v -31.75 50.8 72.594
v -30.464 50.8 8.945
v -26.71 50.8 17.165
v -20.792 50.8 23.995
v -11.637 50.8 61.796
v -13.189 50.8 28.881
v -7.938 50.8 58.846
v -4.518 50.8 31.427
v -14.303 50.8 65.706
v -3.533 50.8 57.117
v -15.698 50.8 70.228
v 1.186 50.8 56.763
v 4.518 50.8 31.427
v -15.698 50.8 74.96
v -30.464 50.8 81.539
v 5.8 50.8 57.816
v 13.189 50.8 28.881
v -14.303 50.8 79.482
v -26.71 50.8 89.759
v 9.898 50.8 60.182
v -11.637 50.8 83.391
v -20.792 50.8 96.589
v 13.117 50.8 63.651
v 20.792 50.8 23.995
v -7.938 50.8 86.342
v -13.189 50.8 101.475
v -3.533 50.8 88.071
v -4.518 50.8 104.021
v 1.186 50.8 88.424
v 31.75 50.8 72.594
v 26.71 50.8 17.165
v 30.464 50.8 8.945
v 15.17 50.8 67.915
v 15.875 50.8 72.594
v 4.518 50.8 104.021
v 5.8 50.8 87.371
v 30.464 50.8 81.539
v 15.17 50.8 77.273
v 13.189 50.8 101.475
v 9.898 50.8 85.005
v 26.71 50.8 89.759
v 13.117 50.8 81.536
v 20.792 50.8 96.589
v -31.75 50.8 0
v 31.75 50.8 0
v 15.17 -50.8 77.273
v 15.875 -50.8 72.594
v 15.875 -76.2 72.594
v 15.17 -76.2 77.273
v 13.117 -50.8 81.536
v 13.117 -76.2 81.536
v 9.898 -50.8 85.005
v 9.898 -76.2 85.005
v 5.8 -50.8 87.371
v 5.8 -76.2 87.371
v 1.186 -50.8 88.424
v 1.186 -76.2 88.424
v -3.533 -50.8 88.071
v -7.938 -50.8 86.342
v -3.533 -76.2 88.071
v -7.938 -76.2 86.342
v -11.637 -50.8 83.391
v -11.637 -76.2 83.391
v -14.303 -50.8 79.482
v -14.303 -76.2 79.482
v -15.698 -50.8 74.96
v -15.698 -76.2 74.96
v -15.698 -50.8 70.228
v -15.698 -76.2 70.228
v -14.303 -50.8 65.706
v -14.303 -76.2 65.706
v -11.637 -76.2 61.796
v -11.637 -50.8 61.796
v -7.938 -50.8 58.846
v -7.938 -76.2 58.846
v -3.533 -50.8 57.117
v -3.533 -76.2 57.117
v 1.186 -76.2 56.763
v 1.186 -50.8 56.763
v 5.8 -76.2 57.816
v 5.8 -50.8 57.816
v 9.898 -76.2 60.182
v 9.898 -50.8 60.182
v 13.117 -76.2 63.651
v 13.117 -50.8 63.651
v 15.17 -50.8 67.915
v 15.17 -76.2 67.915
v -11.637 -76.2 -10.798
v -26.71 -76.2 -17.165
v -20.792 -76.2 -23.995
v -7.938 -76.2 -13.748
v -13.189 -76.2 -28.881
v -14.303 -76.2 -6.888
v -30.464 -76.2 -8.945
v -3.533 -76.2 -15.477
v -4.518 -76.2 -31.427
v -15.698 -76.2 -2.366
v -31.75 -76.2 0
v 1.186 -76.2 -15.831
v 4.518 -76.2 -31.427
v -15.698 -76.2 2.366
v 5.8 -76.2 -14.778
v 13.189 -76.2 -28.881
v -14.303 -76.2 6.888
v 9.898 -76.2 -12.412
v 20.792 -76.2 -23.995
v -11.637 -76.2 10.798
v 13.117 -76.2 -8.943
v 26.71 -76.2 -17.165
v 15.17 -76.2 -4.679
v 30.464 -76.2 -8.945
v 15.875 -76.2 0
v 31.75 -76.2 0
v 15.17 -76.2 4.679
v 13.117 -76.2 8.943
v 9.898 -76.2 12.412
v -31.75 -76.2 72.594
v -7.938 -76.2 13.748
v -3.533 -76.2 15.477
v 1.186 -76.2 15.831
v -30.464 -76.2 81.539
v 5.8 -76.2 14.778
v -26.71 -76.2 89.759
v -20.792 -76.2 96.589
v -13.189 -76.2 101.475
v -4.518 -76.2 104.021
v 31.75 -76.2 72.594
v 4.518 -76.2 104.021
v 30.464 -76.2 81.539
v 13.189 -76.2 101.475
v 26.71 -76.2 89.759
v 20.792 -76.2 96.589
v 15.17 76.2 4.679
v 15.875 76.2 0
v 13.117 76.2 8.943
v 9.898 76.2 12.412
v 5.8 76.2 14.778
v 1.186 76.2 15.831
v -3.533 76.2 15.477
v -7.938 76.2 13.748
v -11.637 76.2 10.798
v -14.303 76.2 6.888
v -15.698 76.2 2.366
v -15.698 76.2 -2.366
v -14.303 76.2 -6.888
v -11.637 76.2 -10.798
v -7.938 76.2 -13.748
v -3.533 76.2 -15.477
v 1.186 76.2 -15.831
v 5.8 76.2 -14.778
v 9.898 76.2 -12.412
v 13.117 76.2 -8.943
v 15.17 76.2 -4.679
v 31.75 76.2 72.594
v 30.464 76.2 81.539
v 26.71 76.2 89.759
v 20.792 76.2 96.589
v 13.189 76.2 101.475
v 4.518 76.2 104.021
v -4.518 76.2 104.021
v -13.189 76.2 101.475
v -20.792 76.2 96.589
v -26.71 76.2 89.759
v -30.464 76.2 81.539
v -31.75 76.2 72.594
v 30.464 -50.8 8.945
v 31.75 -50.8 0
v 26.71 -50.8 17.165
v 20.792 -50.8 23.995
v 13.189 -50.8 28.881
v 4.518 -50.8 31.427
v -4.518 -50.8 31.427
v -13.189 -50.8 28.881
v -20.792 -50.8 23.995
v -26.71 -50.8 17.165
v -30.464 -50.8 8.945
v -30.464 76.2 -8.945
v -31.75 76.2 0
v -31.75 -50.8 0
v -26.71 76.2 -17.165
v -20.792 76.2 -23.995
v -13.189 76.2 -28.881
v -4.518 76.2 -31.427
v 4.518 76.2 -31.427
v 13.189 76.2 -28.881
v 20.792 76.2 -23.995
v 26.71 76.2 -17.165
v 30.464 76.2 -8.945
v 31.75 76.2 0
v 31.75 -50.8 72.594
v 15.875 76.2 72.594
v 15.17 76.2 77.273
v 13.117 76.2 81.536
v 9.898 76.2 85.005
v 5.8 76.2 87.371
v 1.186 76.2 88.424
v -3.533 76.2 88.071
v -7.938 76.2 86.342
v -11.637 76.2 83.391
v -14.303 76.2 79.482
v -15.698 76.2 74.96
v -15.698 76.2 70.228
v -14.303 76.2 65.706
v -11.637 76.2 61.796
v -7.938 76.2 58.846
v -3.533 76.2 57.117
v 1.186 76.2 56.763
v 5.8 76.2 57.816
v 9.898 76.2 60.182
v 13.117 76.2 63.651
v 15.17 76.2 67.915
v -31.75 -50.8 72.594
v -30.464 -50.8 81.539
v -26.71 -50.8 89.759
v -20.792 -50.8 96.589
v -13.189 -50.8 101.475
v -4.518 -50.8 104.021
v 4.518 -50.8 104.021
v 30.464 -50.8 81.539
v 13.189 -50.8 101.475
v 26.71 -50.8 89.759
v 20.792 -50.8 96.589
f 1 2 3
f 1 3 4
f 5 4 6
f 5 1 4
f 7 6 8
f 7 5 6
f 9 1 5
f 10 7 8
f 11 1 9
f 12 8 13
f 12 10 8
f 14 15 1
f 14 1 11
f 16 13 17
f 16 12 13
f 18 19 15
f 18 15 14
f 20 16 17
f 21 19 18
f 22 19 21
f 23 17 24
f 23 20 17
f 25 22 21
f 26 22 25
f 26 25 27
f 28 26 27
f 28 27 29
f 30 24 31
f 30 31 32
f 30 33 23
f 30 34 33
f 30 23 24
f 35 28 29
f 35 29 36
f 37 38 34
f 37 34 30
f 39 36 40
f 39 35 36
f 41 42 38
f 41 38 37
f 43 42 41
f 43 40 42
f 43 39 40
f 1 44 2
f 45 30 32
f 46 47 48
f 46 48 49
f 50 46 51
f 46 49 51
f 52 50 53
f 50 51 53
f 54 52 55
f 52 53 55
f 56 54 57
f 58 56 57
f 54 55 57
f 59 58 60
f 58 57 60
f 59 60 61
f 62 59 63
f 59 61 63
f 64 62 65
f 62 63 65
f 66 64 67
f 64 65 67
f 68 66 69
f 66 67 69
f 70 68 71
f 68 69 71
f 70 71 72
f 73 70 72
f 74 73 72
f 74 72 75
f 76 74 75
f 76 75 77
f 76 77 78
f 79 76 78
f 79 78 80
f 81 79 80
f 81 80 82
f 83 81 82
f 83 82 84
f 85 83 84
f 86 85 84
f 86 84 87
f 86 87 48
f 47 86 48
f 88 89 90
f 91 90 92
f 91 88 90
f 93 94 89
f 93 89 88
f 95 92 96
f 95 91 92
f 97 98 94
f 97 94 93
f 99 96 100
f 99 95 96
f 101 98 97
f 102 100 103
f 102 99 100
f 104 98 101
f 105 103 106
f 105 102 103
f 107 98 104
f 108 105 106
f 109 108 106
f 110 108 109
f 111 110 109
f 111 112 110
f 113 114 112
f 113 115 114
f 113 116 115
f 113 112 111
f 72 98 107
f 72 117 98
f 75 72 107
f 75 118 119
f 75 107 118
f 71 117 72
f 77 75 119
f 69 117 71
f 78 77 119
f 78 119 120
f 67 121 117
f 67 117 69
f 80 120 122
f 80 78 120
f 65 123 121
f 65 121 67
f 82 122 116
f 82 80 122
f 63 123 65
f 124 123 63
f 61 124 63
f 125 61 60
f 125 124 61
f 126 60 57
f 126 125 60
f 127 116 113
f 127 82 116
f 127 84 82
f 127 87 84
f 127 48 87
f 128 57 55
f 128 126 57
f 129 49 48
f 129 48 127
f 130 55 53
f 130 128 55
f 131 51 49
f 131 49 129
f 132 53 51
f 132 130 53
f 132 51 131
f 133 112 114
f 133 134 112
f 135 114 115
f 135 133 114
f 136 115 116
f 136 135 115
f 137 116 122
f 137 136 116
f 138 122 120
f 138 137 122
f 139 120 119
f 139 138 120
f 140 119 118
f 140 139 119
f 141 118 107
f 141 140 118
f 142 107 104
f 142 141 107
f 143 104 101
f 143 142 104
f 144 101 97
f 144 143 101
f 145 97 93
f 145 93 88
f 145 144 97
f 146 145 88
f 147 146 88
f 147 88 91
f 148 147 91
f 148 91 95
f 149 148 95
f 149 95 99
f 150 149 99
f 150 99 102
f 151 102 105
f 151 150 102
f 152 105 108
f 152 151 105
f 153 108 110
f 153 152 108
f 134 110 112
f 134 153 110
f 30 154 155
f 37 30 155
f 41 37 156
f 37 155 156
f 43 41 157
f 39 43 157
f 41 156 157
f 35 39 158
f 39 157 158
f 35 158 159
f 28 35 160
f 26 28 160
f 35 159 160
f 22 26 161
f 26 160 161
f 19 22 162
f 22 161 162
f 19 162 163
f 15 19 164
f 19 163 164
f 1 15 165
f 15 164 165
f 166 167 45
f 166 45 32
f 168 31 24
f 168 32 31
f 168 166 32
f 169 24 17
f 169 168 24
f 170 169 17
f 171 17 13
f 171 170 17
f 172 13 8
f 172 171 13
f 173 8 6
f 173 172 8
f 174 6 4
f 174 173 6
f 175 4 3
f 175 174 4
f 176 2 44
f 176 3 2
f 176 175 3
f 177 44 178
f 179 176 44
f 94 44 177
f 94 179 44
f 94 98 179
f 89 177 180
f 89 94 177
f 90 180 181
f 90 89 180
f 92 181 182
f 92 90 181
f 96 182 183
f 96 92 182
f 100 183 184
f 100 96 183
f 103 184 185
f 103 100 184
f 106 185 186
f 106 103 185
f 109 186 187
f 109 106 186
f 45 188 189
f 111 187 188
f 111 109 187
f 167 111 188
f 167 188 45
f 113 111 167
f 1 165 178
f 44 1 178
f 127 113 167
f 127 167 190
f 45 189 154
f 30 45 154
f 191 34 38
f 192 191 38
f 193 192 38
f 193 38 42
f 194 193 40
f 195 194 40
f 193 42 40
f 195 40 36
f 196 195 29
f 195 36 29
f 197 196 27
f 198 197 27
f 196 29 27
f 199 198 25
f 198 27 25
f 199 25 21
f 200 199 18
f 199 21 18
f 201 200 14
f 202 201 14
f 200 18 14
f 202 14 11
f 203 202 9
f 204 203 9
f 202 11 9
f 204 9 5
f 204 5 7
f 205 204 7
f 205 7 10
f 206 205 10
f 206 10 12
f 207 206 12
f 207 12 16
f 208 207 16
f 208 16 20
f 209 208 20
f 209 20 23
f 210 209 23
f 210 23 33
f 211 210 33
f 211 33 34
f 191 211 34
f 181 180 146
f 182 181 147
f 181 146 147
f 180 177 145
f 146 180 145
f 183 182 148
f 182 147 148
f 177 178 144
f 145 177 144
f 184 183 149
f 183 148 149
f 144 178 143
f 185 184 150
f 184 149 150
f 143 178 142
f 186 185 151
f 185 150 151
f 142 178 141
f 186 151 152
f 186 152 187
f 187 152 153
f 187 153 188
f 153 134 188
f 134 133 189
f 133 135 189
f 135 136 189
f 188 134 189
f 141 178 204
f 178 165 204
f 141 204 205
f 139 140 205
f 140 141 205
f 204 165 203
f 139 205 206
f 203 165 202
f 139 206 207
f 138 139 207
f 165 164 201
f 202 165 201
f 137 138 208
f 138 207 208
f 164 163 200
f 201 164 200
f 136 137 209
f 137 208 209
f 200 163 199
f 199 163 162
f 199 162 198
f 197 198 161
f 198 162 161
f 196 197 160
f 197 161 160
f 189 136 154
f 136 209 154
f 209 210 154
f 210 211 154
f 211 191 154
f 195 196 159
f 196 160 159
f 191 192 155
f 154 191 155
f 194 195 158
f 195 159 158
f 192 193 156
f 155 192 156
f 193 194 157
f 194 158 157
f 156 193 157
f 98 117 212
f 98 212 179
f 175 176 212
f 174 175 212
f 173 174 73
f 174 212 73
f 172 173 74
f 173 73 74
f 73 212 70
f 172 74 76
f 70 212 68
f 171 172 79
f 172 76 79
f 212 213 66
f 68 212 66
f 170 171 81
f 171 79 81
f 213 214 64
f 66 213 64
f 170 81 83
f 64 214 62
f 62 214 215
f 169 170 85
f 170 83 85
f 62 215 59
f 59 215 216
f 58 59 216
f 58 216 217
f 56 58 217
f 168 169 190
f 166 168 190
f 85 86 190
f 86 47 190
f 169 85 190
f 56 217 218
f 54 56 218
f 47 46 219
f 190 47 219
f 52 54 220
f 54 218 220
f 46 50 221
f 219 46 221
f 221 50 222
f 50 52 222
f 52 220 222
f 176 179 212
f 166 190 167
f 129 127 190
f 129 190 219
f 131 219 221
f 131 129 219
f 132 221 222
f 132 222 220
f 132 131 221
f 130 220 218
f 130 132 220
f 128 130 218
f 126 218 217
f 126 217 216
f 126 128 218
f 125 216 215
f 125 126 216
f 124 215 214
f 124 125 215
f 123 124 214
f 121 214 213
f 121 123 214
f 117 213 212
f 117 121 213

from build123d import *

# Parameters (mm, degrees)
F0_R     = 31.75
F0_R_2   = 15.875
F1_DEPTH = 76.2
F3_DEPTH = 25.4
F5_R     = 15.875
F6_DEPTH = 152.401


with BuildPart() as f1:
    # F0 (on Front) → F1 (new body, symmetric)
    with BuildSketch(Plane.XZ):
        Circle(F0_R)
        Circle(F0_R_2, mode=Mode.SUBTRACT)
    extrude(amount=F1_DEPTH, both=True)

    # F2 (on face) → F3 (join)
    with BuildSketch(Plane.XZ.offset(76.2)):
        with BuildLine():
            ThreePointArc((31.75, 72.5937485695), (0, 104.3437485695), (-31.75, 72.5937485695))
            Line((-31.75, 72.5937485695), (31.75, 72.5937485695))
        make_face()
        with BuildLine():
            Line((31.75, 72.5937485695), (-31.75, 72.5937485695))
            ThreePointArc((-31.75, 72.5937485695), (0, 40.8437485695), (31.75, 72.5937485695))
        make_face()
        with BuildLine():
            Line((-31.75, 72.5937485695), (-31.75, 0))
            ThreePointArc((-31.75, 0), (0, 31.75), (31.75, 0))
            Line((31.75, 0), (31.75, 72.5937485695))
            ThreePointArc((31.75, 72.5937485695), (0, 40.8437485695), (-31.75, 72.5937485695))
        make_face()
    extrude(amount=-F3_DEPTH)

    # F4: F1 across plane


with BuildPart() as f1_1:
    add(f1.part)
    add(f1.part.mirror(Plane.XZ))

    # F5 (on face) → F6 (cut, through all)
    with BuildSketch(Plane.XZ.offset(76.2)):
        with Locations((0, 72.5937485695)):
            Circle(F5_R)
    extrude(amount=-F6_DEPTH, mode=Mode.SUBTRACT)


solid = f1_1.part
